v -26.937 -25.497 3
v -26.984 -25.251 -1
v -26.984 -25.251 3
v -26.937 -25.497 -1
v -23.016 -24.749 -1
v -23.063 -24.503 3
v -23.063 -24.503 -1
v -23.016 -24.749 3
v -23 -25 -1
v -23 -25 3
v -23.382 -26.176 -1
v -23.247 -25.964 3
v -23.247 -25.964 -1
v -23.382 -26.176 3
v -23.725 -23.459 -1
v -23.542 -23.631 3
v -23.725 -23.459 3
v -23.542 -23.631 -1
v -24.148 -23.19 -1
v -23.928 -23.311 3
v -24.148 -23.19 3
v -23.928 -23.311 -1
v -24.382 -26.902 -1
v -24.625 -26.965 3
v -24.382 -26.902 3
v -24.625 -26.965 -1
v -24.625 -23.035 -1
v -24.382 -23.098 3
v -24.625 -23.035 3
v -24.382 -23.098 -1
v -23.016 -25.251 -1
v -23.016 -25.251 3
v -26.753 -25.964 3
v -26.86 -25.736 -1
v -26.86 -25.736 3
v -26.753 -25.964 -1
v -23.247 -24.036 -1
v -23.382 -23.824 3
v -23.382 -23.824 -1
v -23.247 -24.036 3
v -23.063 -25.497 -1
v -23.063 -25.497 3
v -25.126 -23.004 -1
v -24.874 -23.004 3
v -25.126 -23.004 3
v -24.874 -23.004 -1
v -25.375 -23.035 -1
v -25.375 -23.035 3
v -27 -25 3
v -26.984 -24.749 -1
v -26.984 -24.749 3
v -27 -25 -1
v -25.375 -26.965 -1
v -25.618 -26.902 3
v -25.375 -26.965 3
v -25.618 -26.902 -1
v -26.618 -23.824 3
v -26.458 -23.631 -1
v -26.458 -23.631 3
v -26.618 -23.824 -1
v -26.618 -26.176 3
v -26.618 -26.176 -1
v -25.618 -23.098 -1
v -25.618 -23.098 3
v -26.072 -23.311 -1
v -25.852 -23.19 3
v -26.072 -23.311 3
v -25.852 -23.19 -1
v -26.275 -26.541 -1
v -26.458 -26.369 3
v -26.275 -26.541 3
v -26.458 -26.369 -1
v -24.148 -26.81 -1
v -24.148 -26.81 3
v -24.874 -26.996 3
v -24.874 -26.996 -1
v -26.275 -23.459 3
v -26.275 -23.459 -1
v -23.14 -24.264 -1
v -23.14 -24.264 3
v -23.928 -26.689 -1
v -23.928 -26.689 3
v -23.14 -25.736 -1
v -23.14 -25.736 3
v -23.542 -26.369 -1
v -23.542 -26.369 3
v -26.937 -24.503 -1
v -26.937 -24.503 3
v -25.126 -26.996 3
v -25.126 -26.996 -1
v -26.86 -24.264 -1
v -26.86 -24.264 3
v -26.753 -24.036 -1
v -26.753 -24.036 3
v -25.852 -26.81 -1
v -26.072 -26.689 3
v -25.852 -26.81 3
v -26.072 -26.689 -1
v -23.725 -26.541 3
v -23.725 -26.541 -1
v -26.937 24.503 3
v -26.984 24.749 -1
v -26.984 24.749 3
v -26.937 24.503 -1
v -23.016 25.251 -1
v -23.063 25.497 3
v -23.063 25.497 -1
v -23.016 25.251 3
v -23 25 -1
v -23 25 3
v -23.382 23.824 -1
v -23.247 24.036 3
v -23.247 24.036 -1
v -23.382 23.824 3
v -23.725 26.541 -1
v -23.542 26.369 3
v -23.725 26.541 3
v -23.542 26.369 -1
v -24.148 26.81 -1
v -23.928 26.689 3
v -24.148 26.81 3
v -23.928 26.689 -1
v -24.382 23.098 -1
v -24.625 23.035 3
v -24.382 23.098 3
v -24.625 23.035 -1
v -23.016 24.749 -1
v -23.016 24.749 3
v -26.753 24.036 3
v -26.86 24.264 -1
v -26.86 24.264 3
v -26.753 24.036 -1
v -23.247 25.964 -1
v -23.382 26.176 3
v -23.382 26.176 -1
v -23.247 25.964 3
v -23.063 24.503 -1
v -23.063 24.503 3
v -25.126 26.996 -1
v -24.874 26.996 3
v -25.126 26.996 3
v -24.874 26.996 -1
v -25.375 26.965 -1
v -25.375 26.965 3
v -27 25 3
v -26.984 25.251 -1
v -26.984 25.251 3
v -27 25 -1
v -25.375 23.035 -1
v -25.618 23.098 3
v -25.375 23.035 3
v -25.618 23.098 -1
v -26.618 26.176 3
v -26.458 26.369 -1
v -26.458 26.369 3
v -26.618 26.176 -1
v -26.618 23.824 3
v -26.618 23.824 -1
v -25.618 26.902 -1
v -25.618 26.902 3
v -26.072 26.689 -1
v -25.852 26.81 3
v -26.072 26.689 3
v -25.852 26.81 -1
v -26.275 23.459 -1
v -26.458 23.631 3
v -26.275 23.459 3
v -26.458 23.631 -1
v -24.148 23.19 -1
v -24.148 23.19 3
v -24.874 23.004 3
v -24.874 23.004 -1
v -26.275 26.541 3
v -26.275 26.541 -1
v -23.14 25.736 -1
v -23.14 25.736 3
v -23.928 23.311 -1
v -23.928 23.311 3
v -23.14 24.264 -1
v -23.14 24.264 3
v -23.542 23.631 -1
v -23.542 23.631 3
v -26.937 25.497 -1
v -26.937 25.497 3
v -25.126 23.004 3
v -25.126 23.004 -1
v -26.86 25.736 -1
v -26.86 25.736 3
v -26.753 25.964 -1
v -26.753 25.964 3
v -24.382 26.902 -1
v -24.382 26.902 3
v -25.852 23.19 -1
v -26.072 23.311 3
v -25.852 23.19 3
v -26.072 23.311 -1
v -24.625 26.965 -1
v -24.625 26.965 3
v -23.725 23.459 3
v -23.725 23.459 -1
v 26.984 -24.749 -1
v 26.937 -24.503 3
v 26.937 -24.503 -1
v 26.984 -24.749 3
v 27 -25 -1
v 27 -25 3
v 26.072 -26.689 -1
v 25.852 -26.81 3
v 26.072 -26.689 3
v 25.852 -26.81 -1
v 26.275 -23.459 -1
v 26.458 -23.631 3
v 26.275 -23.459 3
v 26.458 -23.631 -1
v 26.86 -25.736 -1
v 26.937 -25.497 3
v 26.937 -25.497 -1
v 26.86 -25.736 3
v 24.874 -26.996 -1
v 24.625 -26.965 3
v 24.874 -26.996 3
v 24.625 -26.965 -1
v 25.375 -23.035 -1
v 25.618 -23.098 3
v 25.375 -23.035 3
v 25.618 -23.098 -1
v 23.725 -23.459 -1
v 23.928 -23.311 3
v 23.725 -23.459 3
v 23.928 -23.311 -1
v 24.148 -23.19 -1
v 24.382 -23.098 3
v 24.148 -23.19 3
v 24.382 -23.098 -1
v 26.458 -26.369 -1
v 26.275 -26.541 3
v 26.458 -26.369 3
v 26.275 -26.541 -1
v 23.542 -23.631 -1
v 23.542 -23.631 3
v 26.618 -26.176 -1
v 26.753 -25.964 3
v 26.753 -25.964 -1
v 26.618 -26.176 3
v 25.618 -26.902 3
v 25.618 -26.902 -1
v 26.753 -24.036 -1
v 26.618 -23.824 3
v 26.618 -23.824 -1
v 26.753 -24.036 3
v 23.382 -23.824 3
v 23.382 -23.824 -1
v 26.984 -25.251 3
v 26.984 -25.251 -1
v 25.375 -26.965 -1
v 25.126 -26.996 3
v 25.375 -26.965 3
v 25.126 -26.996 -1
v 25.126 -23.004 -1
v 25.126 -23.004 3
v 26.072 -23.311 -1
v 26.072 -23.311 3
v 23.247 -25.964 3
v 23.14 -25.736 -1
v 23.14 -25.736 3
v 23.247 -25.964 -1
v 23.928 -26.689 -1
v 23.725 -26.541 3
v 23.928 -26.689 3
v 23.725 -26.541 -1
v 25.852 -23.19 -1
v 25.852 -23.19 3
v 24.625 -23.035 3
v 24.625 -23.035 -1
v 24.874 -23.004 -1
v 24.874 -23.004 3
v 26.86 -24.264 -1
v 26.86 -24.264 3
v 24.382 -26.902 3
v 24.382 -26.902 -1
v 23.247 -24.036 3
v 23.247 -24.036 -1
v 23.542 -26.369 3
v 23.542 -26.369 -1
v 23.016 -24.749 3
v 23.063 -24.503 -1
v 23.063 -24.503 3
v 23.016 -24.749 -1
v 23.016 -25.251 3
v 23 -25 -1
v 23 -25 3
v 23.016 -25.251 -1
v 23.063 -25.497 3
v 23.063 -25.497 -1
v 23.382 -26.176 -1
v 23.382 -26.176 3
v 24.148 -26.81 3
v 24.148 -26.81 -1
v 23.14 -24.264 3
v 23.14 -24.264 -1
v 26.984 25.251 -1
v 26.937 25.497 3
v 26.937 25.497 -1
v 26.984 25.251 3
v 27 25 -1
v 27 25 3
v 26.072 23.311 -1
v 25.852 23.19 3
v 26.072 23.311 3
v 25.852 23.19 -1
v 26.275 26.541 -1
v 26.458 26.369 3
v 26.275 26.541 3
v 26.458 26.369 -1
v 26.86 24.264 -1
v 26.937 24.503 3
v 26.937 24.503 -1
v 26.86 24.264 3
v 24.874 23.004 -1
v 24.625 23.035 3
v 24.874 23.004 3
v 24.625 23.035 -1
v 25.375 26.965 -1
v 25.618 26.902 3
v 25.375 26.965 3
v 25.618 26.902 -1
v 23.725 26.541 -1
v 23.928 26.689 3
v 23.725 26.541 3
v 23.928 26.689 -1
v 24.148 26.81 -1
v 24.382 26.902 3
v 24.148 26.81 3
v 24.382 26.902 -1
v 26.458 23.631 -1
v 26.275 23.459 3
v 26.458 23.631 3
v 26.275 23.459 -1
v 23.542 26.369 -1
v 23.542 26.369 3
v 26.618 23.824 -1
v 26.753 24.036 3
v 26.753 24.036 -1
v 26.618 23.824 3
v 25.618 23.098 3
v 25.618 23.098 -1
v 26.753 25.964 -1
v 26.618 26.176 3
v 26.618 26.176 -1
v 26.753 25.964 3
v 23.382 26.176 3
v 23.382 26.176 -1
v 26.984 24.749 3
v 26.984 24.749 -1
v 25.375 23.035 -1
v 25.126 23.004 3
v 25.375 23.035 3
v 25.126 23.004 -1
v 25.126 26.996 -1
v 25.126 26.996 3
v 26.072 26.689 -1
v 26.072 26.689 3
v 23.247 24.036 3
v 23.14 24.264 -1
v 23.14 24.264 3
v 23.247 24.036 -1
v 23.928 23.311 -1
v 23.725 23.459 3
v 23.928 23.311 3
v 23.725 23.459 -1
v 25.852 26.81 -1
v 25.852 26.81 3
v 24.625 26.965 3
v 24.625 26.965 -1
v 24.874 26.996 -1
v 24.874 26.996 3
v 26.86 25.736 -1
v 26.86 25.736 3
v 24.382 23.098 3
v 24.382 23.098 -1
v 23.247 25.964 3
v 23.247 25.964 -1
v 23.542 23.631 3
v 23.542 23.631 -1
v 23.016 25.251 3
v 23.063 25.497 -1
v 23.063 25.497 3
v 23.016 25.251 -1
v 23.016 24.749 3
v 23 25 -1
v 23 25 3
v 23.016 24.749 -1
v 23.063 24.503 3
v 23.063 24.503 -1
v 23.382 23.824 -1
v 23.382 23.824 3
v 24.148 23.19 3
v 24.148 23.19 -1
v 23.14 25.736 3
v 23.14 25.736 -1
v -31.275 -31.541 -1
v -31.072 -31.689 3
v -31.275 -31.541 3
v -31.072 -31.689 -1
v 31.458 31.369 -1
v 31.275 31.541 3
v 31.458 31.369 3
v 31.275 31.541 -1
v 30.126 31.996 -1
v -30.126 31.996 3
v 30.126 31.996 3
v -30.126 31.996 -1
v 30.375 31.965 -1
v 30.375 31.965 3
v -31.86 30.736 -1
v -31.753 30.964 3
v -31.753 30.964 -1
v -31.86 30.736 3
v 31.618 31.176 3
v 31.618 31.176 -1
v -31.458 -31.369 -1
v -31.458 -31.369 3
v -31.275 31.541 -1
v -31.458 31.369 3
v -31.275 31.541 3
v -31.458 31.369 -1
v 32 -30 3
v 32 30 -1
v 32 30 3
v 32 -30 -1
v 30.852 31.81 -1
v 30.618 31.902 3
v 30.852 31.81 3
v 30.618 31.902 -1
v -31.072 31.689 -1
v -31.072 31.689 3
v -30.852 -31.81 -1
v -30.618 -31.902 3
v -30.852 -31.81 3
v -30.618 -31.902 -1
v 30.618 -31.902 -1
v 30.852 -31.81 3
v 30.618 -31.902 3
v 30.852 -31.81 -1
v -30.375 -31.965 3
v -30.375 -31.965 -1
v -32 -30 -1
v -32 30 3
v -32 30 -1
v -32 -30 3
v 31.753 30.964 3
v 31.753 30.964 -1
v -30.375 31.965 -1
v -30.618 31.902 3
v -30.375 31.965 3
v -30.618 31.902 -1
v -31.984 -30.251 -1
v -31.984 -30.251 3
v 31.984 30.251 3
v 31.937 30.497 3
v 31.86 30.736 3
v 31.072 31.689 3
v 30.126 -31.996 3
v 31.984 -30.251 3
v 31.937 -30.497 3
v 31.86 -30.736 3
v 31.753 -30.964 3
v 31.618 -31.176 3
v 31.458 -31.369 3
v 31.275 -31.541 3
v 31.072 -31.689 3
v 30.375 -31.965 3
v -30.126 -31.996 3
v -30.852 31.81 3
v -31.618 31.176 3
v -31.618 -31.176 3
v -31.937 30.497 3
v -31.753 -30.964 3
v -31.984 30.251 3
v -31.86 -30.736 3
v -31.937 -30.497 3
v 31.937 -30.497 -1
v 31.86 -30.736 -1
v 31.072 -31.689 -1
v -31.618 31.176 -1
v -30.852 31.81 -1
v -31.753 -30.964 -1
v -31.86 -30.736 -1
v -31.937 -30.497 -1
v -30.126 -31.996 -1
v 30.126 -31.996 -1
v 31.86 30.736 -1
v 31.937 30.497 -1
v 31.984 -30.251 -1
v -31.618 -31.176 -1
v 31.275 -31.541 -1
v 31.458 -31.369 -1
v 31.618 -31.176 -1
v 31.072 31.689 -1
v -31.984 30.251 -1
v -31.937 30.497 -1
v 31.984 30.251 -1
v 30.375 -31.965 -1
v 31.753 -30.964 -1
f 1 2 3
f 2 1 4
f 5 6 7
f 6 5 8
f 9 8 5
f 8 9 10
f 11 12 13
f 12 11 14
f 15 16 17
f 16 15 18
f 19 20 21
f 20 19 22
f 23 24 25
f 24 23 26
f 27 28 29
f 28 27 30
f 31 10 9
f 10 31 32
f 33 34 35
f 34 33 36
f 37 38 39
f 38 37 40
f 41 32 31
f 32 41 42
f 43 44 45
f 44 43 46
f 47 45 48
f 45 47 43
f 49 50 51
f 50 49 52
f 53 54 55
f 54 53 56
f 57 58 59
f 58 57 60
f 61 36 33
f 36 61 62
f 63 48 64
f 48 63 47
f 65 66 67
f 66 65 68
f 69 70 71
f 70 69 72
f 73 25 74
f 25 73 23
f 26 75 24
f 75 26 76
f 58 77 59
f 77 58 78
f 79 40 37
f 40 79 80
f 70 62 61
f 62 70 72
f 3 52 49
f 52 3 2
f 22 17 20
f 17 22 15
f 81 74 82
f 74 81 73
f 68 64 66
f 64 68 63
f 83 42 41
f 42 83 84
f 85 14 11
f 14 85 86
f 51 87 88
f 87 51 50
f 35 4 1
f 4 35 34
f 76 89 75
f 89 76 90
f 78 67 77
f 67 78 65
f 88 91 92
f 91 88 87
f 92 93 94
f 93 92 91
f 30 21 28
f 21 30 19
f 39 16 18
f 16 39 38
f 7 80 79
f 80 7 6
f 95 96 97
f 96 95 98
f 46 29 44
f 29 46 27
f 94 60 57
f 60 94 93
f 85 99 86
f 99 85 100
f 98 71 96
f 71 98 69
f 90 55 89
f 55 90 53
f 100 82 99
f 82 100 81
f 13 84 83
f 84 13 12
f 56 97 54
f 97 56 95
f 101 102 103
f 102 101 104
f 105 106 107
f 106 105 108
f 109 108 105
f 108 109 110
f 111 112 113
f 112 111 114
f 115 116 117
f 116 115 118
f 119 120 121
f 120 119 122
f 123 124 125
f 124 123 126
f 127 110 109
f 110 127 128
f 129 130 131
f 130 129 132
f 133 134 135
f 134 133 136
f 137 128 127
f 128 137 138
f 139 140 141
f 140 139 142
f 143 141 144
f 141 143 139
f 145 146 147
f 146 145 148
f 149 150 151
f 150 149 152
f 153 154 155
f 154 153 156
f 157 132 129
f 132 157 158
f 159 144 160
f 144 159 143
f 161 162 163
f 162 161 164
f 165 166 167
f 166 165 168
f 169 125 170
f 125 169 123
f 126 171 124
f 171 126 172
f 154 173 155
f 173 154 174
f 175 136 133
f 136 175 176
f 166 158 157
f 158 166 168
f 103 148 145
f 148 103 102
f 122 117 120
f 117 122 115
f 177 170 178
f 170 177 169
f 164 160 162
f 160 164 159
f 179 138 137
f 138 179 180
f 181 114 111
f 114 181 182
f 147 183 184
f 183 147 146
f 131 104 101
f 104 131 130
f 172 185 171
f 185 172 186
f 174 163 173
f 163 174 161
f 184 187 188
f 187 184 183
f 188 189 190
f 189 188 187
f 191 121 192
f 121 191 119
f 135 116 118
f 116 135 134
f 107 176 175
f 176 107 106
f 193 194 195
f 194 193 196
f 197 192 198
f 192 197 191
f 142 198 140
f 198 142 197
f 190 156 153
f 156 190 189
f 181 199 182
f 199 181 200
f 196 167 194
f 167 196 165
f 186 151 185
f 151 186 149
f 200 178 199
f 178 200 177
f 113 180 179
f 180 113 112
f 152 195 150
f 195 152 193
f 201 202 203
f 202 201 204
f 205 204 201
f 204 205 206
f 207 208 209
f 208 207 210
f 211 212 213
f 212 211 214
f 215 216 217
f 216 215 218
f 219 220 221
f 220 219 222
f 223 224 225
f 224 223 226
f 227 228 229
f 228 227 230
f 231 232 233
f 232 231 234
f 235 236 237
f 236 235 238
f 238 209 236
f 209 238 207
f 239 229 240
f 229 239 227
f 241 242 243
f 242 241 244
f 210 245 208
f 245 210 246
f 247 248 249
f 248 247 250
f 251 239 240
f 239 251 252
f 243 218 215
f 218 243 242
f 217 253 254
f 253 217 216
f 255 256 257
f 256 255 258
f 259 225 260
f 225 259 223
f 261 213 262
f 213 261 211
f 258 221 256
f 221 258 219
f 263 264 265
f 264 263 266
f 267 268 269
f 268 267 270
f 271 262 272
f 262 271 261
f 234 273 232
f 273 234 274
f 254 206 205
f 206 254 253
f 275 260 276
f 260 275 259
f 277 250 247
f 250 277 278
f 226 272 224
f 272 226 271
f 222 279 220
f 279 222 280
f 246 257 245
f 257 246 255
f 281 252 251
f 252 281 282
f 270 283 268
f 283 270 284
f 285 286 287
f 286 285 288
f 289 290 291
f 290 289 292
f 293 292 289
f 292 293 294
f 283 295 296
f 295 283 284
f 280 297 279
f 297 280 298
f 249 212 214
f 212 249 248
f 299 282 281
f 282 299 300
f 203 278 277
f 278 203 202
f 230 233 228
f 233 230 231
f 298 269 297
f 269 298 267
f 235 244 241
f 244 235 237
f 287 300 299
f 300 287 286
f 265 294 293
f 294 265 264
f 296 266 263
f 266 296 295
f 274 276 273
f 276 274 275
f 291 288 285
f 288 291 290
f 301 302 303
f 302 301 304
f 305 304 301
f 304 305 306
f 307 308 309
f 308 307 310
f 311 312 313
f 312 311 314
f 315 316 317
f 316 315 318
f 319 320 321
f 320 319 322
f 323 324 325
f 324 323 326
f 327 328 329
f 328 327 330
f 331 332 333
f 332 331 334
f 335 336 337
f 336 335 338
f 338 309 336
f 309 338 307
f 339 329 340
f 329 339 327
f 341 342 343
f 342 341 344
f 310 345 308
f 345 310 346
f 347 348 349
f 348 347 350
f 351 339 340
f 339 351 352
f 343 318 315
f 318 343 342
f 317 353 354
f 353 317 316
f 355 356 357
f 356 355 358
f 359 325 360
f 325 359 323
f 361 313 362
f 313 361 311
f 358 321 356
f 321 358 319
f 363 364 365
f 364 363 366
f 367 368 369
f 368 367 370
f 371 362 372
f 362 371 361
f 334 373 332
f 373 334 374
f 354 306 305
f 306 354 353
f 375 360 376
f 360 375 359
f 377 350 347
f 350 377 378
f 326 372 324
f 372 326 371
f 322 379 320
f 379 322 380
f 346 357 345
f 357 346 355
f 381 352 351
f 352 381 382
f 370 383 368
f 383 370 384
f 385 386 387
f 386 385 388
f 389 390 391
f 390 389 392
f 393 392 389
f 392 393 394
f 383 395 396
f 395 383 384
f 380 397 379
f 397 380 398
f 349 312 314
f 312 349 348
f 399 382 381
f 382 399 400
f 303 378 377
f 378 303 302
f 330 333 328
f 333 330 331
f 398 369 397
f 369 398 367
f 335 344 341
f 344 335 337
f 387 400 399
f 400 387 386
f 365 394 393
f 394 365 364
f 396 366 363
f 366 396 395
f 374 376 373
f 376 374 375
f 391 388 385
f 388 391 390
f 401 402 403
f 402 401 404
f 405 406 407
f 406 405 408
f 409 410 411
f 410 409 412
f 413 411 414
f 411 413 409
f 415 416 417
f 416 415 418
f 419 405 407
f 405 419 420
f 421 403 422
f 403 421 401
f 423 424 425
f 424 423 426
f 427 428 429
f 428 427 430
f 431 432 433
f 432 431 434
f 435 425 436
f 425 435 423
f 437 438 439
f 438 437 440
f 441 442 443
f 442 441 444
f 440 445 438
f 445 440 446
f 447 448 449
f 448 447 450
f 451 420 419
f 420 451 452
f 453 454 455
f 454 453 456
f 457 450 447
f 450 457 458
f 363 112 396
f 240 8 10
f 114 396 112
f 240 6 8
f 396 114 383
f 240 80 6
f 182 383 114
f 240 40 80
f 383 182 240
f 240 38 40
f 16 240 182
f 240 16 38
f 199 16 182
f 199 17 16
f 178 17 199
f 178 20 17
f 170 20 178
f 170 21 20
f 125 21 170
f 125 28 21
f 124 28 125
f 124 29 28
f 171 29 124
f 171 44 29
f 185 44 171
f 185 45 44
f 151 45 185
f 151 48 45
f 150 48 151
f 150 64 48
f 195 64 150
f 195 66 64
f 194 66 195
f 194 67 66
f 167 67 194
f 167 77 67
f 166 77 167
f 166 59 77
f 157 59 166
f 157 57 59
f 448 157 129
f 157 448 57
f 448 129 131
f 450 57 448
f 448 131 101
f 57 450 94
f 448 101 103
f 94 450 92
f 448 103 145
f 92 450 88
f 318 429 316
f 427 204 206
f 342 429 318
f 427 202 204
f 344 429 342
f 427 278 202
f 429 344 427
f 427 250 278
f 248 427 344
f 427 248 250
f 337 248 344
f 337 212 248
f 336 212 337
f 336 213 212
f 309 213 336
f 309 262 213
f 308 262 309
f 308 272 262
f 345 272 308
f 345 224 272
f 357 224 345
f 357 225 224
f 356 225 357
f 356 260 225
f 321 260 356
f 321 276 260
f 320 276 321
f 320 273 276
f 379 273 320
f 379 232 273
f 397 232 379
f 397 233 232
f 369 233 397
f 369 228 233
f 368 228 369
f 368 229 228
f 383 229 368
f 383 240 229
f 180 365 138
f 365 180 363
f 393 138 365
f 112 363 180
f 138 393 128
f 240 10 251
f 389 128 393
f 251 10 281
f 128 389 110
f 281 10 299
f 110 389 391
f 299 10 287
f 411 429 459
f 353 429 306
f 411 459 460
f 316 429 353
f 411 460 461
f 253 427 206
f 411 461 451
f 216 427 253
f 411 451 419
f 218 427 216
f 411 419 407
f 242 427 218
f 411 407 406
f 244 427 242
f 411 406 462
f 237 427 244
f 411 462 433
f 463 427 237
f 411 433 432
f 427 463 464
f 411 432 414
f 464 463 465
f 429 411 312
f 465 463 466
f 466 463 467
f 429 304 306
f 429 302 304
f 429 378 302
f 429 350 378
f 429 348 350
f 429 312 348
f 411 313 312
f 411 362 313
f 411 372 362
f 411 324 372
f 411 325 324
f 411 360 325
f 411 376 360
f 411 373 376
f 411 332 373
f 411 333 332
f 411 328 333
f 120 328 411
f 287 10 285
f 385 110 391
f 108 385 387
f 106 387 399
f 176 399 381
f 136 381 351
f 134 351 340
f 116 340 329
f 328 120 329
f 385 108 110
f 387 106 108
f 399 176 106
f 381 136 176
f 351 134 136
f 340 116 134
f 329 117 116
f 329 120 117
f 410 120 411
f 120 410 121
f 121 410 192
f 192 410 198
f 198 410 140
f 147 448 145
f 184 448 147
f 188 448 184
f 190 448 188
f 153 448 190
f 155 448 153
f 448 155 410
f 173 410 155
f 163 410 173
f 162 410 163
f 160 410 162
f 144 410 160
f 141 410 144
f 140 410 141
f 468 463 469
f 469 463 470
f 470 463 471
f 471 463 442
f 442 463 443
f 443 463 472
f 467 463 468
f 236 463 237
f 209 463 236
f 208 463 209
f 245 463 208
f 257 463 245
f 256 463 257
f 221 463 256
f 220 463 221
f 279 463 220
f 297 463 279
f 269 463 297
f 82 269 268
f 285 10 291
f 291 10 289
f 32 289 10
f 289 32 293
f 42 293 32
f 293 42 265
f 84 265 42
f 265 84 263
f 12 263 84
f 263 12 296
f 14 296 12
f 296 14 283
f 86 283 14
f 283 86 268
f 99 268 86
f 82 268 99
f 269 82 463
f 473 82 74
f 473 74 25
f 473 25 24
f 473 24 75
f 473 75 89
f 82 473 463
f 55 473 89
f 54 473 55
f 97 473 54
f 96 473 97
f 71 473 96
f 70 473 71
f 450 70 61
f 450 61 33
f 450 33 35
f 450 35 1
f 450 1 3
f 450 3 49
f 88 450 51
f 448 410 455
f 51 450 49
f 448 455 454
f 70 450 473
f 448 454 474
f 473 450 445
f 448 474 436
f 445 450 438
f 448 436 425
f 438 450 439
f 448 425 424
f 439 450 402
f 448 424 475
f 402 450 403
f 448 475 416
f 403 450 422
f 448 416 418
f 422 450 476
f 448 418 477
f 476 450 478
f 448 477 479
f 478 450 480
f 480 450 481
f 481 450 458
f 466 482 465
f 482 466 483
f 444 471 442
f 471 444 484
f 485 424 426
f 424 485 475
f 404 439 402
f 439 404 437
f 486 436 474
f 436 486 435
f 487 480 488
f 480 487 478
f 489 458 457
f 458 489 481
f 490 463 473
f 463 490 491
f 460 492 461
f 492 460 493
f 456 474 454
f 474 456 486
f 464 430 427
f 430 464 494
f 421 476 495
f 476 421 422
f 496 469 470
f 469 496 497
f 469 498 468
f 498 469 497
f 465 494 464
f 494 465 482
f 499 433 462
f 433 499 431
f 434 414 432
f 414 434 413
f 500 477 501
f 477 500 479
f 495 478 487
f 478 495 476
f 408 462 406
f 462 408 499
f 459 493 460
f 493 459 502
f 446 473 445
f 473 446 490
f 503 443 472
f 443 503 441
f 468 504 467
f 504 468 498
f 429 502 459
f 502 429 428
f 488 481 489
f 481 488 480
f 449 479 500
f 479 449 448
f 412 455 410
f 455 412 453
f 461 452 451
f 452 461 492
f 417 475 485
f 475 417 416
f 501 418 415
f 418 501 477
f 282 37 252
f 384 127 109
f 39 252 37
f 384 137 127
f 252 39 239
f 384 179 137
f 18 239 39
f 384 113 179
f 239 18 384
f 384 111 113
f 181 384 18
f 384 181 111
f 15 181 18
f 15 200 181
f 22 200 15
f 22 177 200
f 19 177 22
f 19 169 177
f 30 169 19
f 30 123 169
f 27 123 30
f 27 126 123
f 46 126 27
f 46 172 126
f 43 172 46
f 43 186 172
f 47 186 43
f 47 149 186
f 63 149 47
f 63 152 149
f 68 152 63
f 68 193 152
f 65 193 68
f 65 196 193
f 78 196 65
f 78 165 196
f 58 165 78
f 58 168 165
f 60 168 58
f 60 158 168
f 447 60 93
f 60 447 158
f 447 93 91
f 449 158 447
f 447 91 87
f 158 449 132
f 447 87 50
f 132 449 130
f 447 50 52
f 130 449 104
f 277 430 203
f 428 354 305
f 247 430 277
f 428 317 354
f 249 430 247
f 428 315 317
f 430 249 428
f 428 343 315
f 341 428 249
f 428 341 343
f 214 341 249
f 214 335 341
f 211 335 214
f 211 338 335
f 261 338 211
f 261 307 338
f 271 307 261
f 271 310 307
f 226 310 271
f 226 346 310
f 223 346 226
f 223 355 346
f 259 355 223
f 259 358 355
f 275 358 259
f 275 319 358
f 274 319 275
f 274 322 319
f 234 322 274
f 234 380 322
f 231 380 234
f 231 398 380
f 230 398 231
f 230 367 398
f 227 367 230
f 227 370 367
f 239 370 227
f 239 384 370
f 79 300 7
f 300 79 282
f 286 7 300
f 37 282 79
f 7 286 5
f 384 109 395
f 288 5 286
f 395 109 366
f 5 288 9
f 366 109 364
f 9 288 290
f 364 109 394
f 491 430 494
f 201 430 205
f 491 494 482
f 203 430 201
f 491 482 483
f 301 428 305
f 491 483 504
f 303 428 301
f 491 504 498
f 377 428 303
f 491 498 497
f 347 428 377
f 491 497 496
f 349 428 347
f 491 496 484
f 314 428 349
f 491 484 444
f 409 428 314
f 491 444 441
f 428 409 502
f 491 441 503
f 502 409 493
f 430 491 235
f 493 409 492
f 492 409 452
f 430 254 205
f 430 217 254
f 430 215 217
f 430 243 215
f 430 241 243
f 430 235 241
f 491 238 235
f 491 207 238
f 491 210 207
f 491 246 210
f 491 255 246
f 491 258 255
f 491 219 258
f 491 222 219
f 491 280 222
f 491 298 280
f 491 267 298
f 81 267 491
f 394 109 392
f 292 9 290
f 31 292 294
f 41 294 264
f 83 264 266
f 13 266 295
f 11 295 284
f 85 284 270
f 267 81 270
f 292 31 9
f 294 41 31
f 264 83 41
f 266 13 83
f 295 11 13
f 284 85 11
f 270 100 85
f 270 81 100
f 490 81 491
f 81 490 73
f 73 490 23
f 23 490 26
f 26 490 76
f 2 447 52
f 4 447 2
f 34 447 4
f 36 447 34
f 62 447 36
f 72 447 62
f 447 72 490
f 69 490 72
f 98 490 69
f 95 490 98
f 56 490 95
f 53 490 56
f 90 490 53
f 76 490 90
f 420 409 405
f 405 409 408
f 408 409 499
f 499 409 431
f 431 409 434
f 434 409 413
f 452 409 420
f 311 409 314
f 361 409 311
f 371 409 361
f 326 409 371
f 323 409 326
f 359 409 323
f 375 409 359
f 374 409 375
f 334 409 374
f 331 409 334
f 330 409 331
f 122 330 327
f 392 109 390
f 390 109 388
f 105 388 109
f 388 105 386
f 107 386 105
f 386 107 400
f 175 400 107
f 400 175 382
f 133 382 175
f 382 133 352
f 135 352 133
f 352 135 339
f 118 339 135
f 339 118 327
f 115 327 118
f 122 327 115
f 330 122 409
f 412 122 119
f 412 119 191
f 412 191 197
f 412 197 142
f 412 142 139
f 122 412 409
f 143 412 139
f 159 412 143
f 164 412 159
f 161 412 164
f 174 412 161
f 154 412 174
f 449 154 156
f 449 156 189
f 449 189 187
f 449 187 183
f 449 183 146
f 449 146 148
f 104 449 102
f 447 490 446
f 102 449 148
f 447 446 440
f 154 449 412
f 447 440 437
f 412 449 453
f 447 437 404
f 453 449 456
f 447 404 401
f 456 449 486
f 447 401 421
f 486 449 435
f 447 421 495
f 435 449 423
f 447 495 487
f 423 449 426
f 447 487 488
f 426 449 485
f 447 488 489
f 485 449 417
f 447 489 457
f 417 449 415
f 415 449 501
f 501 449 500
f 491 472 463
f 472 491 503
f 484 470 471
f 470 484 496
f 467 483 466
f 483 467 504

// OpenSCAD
$fn=50;
difference() {
  minkowski() {
    cube(center=true, size=[60,60,2]);
    cylinder(r=2, h=2);
  }

  for (x = [-25, 25]) {
    for (y = [-25, 25]) {
      # translate([x, y, -2]) cylinder(r=2, h=6);
    }
  }
}
